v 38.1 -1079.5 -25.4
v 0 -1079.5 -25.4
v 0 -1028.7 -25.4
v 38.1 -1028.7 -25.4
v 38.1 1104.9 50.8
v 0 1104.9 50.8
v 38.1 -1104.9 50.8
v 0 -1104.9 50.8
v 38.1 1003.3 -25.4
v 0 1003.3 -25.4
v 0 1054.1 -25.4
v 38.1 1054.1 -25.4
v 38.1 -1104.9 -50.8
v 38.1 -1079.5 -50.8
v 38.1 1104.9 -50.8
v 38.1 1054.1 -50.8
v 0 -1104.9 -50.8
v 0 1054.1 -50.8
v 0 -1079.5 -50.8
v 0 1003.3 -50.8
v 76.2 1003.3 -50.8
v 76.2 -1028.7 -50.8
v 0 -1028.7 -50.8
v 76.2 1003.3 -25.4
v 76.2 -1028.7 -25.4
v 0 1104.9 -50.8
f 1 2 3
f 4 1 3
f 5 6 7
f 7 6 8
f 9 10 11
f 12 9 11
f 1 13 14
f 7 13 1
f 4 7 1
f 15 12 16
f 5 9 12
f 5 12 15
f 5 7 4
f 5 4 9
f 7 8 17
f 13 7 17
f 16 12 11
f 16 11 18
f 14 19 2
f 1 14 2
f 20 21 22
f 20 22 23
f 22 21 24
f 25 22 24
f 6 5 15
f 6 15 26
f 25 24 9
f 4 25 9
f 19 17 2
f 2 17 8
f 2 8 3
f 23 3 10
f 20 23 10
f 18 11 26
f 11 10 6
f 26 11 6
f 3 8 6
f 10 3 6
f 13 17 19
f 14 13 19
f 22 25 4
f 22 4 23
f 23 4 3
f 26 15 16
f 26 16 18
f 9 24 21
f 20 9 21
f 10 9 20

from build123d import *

# Parameters (mm, degrees)
F1_DEPTH = 38.1
F2_W     = 38.1
F2_H     = 25.4
F3_DEPTH = 2133.6
F4_DEPTH = 101.6


with BuildPart() as f1:
    # F0 (on Right) → F1 (new body)
    with BuildSketch(Plane.YZ):
        Polygon((1104.9, 50.8), (-1104.9, 50.8), (-1104.9, -50.8), (-1079.5, -50.8), (-1079.5, -25.4), (-1028.7, -25.4), (-1028.7, -50.8), (1003.3, -50.8), (1003.3, -25.4), (1054.1, -25.4), (1054.1, -50.8), (1104.9, -50.8), align=None)
    extrude(amount=F1_DEPTH)

    # F2 (on face) → F3 (join)
    with BuildSketch(Plane(origin=(0, 1104.9, 0), x_dir=(-1, 0, 0), z_dir=(0, 1, 0))):
        with Locations((-57.15, -38.1)):
            Rectangle(F2_W, F2_H)
    extrude(amount=-F3_DEPTH)

    # F2 (on face) → F4 (cut)
    with BuildSketch(Plane(origin=(0, 1104.9, 0), x_dir=(-1, 0, 0), z_dir=(0, 1, 0))):
        with Locations((-57.15, -38.1)):
            Rectangle(F2_W, F2_H)
    extrude(amount=-F4_DEPTH, mode=Mode.SUBTRACT)


solid = f1.part
